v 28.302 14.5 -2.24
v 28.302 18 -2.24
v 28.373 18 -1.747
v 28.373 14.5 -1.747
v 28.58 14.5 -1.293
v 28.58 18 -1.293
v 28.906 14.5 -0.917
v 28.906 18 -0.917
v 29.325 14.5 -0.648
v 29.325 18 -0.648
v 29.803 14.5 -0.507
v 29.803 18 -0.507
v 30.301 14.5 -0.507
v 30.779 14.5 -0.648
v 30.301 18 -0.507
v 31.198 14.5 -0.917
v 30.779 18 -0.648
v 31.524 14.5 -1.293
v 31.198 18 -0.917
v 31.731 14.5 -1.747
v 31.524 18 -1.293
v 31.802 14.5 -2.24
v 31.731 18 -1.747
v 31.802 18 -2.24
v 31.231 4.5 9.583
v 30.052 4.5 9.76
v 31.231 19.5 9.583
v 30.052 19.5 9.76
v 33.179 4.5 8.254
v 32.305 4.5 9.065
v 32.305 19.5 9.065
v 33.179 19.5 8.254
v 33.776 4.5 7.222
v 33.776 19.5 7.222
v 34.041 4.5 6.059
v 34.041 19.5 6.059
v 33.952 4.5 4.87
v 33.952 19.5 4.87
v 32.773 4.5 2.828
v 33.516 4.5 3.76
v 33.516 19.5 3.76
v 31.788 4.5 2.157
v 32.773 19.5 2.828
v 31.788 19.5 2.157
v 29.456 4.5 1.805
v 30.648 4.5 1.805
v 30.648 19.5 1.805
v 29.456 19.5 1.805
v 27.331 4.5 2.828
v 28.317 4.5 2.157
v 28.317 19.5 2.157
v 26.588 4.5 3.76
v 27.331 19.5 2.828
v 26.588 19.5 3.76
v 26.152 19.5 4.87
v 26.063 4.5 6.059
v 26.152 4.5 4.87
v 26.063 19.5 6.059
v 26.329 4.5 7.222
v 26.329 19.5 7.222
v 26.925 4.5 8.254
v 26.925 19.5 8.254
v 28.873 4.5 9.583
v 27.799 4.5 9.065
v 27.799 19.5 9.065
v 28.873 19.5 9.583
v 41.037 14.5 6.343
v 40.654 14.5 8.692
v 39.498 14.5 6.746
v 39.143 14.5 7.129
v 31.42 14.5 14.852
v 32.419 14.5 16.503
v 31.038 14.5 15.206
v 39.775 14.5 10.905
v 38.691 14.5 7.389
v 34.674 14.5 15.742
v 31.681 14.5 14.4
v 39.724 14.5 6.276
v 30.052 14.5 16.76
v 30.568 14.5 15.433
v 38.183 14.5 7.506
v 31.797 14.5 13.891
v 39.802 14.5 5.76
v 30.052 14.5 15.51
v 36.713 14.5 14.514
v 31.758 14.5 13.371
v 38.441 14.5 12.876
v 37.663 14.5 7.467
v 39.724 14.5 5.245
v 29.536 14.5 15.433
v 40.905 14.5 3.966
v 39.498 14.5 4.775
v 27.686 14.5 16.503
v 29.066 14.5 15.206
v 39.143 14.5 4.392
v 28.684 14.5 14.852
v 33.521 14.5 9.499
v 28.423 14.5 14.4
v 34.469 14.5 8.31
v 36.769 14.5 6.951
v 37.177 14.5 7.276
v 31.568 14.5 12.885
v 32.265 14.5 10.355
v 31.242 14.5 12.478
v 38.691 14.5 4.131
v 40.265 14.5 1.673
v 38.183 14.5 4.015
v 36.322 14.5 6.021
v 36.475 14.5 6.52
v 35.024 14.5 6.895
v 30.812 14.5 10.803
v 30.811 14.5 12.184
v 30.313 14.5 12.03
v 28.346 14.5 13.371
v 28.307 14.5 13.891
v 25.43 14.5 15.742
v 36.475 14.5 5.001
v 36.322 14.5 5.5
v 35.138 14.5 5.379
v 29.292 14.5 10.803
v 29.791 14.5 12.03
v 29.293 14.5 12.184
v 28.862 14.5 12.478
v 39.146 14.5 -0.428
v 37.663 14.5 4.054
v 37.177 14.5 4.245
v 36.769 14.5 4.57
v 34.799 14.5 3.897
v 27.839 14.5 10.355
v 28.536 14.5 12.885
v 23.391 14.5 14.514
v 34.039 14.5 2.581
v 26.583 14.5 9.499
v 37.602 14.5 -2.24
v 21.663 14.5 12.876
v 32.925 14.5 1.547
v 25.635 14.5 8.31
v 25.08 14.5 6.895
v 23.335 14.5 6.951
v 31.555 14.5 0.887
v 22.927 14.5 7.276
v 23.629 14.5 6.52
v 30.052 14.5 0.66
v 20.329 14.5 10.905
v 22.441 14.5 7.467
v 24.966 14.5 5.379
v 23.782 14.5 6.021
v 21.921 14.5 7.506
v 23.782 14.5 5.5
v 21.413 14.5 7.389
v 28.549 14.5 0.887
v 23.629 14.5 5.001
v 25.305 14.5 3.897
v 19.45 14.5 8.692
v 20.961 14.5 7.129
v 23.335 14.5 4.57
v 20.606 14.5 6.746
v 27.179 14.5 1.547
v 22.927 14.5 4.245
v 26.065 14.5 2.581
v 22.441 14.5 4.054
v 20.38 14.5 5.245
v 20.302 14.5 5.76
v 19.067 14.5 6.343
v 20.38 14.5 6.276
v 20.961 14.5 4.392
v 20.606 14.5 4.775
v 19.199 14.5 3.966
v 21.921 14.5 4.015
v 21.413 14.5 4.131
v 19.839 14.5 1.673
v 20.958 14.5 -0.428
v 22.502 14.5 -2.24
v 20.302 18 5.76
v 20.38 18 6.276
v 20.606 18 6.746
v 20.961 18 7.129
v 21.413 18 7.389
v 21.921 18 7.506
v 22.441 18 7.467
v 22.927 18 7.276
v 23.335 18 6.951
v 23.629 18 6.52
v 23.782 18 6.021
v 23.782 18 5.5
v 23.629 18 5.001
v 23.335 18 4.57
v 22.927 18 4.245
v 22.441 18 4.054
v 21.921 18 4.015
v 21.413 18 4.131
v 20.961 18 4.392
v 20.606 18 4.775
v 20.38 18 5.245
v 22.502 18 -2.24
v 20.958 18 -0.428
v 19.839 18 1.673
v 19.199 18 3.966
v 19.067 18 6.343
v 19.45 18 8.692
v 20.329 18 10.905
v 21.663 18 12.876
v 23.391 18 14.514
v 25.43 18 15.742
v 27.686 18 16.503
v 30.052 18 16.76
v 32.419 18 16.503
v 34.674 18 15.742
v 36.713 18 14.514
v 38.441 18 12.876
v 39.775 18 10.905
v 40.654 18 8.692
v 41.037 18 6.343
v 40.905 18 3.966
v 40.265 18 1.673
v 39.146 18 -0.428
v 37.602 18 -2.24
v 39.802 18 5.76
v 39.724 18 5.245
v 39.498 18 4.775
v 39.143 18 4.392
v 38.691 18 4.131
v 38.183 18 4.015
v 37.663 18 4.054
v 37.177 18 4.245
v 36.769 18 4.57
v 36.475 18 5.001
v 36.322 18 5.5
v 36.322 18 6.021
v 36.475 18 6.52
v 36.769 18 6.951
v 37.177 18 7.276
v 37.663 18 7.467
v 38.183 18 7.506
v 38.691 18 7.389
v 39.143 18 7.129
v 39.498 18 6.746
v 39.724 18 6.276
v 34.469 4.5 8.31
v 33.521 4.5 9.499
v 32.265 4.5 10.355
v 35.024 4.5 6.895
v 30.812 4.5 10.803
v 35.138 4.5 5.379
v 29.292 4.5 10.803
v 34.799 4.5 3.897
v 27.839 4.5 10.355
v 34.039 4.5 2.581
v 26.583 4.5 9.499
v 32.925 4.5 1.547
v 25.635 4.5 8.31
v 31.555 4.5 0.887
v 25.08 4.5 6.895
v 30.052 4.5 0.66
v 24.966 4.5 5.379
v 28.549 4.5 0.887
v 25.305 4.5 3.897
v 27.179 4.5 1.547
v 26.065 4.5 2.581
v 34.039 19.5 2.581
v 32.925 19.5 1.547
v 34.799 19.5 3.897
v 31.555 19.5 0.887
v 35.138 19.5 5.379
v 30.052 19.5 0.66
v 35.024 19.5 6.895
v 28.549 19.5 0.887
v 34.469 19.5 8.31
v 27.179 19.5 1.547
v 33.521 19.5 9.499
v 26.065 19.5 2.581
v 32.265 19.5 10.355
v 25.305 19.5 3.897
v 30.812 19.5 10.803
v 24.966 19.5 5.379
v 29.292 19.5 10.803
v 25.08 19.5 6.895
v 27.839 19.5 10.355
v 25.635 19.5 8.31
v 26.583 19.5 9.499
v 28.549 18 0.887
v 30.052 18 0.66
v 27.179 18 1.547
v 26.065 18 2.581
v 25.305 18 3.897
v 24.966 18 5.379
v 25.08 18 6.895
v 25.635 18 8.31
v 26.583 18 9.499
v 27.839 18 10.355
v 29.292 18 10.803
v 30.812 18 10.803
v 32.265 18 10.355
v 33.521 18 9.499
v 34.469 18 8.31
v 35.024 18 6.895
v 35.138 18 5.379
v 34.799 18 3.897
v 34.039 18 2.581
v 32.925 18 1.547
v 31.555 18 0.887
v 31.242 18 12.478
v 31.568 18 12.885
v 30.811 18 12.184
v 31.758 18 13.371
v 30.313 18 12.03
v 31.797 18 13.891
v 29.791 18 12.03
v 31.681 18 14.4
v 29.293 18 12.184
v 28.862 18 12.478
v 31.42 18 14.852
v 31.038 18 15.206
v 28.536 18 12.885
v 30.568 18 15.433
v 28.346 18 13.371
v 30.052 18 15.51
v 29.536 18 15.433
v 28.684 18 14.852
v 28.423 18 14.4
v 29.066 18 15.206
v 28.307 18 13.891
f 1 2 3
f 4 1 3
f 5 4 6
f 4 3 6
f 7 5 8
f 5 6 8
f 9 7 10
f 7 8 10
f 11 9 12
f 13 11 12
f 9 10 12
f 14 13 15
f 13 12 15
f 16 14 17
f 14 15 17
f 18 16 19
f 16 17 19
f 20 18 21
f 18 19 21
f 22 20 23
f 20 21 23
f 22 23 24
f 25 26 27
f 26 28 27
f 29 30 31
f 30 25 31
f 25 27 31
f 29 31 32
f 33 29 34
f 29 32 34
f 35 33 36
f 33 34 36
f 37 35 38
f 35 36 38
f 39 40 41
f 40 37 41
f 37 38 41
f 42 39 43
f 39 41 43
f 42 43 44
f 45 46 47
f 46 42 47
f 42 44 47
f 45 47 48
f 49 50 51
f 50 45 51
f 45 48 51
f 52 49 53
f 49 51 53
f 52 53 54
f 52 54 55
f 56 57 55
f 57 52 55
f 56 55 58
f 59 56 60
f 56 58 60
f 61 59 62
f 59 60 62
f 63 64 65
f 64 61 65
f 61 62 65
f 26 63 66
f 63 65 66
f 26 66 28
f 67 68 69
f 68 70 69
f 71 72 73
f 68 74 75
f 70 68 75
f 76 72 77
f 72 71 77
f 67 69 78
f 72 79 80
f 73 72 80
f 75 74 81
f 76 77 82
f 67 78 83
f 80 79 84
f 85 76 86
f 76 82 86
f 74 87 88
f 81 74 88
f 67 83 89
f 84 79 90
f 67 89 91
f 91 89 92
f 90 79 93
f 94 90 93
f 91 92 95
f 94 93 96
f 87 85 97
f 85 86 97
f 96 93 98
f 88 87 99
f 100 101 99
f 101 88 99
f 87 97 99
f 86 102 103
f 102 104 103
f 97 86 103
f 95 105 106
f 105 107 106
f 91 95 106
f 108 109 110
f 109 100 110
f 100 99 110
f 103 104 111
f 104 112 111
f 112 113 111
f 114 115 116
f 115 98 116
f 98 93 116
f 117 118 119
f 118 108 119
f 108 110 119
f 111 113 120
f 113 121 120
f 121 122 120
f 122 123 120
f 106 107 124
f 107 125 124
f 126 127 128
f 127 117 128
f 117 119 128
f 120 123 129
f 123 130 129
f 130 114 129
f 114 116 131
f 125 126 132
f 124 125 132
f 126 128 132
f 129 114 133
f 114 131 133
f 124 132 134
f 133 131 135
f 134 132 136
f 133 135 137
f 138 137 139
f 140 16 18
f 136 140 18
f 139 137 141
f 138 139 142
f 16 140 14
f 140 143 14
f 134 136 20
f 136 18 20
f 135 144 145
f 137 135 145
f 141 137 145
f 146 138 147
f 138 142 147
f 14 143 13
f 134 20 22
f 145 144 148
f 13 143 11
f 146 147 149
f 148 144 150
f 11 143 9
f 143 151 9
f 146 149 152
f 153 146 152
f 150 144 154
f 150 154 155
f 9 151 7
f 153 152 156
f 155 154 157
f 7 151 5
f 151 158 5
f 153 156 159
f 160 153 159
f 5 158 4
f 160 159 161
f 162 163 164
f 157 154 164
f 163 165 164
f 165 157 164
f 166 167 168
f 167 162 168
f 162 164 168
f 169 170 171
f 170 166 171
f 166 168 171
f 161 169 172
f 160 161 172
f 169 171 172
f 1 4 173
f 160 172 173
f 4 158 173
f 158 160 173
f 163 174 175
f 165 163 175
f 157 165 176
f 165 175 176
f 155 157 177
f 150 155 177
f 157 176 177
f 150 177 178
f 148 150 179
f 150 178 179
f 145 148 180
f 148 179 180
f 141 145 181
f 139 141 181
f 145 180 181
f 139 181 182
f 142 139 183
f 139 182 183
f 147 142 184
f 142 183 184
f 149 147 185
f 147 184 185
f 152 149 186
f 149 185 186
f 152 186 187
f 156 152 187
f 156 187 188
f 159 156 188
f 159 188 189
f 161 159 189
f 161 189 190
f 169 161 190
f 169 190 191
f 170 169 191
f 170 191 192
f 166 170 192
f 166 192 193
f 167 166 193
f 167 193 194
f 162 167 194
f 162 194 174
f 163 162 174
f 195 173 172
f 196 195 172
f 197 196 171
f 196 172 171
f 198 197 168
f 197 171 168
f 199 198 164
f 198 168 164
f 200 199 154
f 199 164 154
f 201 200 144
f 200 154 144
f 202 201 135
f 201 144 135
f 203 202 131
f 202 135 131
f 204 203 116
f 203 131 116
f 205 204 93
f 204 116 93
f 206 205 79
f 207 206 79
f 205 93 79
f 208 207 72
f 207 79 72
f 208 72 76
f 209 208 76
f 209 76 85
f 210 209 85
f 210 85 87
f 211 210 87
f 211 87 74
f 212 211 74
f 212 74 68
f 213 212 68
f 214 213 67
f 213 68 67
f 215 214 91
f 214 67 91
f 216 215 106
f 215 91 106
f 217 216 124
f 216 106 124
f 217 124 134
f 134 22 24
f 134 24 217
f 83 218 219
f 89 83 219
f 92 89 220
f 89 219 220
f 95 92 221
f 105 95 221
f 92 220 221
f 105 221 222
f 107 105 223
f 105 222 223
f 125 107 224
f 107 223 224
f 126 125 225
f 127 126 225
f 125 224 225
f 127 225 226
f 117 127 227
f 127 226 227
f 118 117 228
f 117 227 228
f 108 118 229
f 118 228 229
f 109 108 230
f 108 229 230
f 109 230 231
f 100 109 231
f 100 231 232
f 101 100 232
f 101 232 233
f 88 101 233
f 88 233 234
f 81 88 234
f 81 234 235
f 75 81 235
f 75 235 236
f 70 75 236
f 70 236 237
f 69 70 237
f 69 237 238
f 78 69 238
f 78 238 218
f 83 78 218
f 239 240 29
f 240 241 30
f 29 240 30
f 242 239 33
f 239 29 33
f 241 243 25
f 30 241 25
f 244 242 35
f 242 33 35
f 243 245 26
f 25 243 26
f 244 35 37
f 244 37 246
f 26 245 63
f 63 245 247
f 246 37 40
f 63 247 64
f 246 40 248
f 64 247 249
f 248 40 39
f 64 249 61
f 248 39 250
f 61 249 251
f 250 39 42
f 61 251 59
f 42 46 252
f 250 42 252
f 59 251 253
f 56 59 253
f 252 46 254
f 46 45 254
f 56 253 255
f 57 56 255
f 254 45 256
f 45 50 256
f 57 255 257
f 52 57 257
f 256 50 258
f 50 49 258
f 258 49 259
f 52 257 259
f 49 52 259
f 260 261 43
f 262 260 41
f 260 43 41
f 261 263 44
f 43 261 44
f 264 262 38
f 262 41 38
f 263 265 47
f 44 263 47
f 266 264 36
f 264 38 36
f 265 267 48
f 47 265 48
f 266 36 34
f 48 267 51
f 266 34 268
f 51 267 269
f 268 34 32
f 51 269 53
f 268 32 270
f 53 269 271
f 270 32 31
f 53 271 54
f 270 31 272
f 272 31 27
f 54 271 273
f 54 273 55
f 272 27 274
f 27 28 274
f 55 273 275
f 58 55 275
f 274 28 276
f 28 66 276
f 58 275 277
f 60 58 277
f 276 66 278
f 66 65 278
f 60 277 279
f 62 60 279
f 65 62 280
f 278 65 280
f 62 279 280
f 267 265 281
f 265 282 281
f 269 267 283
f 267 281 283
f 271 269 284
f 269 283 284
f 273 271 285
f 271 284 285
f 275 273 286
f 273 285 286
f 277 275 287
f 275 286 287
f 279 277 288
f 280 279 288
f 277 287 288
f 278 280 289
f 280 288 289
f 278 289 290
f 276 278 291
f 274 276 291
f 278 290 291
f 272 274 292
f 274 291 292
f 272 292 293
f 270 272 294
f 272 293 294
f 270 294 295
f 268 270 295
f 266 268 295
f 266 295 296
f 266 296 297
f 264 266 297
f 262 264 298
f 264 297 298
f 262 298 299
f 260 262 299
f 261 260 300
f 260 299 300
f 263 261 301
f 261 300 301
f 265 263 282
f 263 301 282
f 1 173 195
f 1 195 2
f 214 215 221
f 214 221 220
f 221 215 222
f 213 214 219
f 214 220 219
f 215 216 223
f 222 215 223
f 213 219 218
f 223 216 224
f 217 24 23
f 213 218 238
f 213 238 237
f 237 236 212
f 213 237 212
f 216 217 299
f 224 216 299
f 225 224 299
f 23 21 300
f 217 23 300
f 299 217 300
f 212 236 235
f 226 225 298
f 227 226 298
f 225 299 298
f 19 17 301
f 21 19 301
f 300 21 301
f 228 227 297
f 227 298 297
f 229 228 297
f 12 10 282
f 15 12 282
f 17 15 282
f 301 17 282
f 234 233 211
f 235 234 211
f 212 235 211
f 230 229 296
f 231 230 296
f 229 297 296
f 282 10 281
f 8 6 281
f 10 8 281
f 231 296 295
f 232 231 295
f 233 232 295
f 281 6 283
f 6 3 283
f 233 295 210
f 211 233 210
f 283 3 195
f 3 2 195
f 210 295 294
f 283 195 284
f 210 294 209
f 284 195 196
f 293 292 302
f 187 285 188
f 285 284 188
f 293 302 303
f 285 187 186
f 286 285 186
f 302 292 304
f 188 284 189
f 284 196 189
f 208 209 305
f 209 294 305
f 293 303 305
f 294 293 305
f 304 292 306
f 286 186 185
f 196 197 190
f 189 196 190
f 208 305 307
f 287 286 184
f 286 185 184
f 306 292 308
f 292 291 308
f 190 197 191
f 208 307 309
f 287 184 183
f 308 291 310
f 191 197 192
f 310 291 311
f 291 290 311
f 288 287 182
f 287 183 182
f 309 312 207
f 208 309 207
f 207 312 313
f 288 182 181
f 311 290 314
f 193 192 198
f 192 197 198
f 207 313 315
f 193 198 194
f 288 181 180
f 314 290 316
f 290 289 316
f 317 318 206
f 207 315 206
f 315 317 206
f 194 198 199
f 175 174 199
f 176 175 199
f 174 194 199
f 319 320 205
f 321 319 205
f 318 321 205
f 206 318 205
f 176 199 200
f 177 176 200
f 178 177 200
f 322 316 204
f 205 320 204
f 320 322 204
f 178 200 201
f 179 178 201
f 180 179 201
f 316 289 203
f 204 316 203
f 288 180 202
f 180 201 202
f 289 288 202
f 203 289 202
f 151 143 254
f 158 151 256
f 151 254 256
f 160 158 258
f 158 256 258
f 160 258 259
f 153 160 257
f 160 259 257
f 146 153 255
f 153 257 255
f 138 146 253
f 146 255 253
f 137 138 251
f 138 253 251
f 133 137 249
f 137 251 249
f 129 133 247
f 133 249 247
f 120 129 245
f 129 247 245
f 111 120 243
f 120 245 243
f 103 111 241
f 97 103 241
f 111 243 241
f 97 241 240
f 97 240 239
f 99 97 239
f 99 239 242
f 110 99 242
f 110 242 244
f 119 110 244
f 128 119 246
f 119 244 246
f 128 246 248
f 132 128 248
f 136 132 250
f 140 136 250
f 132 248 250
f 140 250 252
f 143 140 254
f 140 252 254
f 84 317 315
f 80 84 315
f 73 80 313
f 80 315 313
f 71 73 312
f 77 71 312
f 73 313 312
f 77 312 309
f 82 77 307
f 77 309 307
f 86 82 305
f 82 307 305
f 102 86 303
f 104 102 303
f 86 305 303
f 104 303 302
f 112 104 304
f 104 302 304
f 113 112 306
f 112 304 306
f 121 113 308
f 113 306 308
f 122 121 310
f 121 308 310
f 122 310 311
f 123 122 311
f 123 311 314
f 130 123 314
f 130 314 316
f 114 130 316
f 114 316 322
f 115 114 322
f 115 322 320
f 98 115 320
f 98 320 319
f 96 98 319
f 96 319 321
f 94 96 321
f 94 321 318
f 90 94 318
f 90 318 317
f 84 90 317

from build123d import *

# Parameters (mm, degrees)
SKETCH151_R             = 4
SKETCH151_R_2           = 1.75
POCKET057_DEPTH         = 84.080664
POLARPATTERN010_COUNT   = 4
SKETCH176_W             = 20.848927
SKETCH176_H             = 11.039979
POCKET062_DEPTH         = 5.001
BODY104_PLACEMENT_ANGLE = 270


with BuildPart() as part:
    # Sketch150 → Revolution007 (revolve)
    with BuildSketch(Plane.YZ):
        Polygon((0, 0), (0, 15), (5.1, 15), (5.1, 13.5), (11, 13.5), (11, 10), (5.1, 10), (5.1, 0), align=None)
    revolve(axis=Axis((0, 0, 0), (0, 0, 1)))

    # Sketch151 (on Face1 of Revolution007) → Pocket057 (cut, through all)
    with BuildSketch(Plane(origin=(0, 0, 15), x_dir=(0, -1, 0), z_dir=(0, 0, 1))):
        Circle(SKETCH151_R)
        with Locations((8, 0)):
            Circle(SKETCH151_R_2)
    pocket057 = extrude(amount=-POCKET057_DEPTH, mode=Mode.SUBTRACT)

    # PolarPattern010: Pocket057 ×4 about axis
    polarpattern010_axis = Axis((0, 0, 15), (0, 0, 1))
    for i in range(1, POLARPATTERN010_COUNT):
        add(pocket057.rotate(polarpattern010_axis, i * 360 / POLARPATTERN010_COUNT), mode=Mode.SUBTRACT)

    # Sketch176 (on Face9 of Clone047) → Pocket062 (cut, through all)
    with BuildSketch(Plane(origin=(0, 0, 10), x_dir=(1, 0, 0), z_dir=(0, 0, -1))):
        with Locations((-0.416263, -13.519989)):
            Rectangle(SKETCH176_W, SKETCH176_H)
    extrude(amount=-POCKET062_DEPTH, mode=Mode.SUBTRACT)


with BuildPart() as part_1:
    # Body104 placement: moved
    add(part.part.moved(Location((30.052038, 4.5, 5.760408))).rotate(Axis((30.052038, 4.5, 5.760408), (1, 0, 0)), BODY104_PLACEMENT_ANGLE))


solid = part_1.part
